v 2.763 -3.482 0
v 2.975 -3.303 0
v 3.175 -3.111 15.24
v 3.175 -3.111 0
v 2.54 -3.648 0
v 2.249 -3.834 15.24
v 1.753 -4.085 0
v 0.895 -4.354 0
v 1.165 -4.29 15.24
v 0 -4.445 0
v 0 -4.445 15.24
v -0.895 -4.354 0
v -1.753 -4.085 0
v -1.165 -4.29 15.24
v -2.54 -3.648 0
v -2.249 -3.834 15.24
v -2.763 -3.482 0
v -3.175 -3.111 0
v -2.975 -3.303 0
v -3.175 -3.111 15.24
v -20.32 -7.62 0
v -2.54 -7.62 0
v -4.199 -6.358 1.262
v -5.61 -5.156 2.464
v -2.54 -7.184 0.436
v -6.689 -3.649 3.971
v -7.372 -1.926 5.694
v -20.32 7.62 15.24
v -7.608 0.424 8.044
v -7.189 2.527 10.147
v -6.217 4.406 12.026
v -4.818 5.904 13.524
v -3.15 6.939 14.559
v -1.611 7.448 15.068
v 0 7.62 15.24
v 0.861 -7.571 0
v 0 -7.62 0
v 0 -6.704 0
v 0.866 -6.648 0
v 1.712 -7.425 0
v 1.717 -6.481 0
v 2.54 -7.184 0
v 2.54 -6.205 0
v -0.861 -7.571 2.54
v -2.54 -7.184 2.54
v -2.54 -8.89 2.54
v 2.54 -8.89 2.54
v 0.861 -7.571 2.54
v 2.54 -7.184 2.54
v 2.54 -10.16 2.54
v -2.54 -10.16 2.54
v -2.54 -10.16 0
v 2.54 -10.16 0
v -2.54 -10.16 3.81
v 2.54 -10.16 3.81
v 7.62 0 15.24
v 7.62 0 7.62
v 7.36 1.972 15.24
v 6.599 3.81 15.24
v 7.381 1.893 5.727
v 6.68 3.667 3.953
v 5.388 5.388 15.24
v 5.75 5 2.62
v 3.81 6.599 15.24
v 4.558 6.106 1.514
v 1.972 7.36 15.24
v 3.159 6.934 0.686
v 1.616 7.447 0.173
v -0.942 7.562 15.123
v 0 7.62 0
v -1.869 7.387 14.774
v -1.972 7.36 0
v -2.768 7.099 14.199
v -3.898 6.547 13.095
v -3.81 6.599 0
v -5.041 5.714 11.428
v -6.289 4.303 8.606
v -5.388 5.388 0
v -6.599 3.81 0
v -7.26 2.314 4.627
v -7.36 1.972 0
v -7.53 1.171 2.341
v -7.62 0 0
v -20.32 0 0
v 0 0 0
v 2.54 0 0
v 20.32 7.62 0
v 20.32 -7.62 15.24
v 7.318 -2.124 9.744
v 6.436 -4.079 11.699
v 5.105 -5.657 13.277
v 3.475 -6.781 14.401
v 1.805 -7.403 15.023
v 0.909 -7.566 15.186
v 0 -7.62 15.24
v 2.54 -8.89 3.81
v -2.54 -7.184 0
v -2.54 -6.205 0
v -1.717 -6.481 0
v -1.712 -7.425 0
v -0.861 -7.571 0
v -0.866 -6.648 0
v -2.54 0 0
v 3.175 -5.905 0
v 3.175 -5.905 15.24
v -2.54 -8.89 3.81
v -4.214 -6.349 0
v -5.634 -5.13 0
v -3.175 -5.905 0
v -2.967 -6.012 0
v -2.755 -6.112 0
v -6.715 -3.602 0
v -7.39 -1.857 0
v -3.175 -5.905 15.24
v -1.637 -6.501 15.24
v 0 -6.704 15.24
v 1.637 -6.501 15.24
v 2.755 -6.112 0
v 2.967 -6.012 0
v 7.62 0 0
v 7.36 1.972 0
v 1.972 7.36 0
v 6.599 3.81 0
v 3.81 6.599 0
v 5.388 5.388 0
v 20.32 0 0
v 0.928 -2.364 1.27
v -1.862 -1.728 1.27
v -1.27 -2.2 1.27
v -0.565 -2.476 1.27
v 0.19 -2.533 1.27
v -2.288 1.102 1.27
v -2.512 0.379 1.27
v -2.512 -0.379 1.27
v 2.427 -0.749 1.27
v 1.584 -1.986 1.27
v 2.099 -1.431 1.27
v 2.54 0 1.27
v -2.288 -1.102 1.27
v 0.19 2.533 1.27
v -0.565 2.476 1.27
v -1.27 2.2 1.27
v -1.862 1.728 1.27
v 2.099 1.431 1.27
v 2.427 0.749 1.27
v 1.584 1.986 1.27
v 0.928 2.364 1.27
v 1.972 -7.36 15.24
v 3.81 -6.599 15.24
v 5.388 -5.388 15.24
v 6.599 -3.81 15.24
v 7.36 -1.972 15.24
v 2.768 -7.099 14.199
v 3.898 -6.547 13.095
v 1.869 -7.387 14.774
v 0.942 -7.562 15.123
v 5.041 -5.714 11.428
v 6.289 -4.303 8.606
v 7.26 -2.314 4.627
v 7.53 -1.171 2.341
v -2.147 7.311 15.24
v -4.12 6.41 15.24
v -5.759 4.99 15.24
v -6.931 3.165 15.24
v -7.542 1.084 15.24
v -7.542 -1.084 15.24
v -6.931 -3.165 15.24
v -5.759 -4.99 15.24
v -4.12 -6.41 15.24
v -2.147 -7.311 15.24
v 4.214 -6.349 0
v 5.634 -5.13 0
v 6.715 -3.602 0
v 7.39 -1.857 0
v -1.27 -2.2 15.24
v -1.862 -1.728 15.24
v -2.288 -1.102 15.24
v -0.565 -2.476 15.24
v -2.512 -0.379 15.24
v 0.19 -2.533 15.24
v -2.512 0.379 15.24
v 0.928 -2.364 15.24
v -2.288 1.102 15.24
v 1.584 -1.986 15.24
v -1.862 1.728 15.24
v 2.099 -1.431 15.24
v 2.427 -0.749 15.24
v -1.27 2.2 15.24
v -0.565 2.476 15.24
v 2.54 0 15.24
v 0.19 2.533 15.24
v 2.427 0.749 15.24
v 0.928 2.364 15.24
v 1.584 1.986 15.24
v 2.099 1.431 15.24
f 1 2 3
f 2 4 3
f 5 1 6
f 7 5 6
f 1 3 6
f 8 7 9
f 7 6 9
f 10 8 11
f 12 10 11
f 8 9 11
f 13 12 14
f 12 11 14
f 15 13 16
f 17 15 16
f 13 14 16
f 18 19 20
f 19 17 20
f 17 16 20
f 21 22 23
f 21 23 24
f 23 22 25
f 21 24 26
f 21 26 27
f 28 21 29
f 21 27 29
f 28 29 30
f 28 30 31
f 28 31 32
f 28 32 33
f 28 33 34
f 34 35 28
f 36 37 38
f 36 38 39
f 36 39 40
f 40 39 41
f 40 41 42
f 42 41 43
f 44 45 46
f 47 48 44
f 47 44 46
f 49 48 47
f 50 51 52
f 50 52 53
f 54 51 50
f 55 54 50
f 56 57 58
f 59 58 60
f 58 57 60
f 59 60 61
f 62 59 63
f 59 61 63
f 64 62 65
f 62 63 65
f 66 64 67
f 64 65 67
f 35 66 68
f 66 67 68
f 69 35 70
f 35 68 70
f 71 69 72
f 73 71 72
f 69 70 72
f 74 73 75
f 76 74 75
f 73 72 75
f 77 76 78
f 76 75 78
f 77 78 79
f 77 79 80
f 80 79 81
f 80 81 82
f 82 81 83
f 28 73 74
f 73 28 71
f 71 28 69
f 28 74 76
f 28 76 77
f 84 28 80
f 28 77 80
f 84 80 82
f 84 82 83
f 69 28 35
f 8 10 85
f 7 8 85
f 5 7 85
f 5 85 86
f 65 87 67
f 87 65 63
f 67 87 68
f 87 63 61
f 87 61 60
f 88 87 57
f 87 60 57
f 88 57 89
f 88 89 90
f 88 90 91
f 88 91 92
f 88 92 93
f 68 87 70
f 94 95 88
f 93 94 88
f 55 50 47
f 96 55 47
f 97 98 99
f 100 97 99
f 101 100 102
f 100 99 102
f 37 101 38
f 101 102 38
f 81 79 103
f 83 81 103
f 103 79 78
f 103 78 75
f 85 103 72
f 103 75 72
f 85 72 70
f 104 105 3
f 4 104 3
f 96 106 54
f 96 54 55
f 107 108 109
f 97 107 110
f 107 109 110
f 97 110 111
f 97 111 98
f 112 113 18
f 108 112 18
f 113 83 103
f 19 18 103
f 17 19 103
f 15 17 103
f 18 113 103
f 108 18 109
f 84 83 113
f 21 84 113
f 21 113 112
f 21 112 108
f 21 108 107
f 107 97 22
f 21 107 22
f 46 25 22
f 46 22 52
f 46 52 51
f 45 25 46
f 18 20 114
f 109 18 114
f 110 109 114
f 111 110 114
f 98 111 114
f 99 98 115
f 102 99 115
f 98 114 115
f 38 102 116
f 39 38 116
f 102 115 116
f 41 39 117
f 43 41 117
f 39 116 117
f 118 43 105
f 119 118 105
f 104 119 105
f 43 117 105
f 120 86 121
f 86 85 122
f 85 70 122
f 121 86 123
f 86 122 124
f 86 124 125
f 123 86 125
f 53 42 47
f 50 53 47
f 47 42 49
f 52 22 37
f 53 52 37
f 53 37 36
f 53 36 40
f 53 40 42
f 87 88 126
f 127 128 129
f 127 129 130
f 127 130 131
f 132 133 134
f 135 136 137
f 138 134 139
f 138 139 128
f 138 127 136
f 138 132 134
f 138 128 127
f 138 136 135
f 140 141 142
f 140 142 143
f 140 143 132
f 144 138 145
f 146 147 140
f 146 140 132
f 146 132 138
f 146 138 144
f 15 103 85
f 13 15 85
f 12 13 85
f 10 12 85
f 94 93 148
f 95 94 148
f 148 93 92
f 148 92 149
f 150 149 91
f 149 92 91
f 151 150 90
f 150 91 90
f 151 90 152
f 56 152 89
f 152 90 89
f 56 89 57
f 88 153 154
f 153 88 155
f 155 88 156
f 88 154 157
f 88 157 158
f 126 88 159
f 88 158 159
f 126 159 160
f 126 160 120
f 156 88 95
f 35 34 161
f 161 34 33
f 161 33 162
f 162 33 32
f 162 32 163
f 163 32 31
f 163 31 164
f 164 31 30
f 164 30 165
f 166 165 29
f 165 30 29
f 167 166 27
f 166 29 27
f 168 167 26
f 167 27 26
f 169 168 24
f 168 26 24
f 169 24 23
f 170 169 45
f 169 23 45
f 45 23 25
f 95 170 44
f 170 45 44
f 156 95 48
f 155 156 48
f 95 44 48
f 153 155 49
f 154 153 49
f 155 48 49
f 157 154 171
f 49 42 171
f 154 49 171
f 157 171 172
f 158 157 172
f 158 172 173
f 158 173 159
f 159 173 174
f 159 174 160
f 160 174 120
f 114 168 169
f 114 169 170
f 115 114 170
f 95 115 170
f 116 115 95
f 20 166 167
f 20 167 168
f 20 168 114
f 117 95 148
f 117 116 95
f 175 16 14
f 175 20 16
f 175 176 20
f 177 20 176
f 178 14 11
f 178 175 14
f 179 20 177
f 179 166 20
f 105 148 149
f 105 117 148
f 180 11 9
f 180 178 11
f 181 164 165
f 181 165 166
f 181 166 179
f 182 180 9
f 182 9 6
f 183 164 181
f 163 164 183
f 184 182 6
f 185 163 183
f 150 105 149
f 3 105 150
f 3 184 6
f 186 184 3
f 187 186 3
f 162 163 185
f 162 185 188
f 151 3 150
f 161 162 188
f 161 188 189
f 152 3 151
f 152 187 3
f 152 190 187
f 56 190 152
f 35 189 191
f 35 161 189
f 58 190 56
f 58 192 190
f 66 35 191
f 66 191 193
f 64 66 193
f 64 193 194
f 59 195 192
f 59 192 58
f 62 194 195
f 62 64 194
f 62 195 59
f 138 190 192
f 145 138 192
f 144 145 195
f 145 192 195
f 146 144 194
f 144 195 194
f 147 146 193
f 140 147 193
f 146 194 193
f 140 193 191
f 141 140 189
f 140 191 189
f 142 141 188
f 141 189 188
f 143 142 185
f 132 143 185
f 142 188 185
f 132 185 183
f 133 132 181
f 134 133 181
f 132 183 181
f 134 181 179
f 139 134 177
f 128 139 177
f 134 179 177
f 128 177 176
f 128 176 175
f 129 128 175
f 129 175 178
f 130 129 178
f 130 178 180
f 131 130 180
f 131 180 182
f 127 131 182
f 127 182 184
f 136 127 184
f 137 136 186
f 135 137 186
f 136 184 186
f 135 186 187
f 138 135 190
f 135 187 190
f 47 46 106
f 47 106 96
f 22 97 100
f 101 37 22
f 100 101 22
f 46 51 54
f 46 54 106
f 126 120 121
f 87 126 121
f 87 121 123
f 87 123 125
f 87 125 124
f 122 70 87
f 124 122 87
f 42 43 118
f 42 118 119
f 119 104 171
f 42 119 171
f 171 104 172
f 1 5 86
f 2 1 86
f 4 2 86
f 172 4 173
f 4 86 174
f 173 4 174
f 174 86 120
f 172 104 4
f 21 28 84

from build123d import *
from build123d import SkipClean  # not in build123d's __all__

# Parameters (mm, degrees)
F0_R      = 7.62
F1_DEPTH  = 15.24
F3_DEPTH  = 20.32
F5_COUNT  = 2
F6_W      = 5.0799995622
F6_H      = 2.54
F7_DEPTH  = 10.16
F8_W      = 5.0799995622
F8_H      = 1.27
F9_DEPTH  = 1.27
F10_R     = 2.54
F11_DEPTH = 13.97
F13_DEPTH = 25.4


with BuildPart() as f1:
    # F0 (on Top) → F1 (new body)
    with BuildSketch(Plane.XY):
        Circle(F0_R)
    extrude(amount=F1_DEPTH)



with BuildPart() as f3:
    # F2 (on Right) → F3 (new body)
    with BuildSketch(Plane.YZ):
        Polygon((-7.62, 15.24), (0, 0), (7.62, 0), align=None)
    extrude(amount=F3_DEPTH)


with BuildPart() as f1_1:
    add(f1.part, clean=False)

    with SkipClean():  # cleaning this boolean's faces spoils the solid; the shape is the same uncleaned
        add(f3.part)  # F5 merges F3
    # F5: F3 ×2 about axis
    f5_axis = Axis((0, 0, 17.5851359963), (0, 0, 1))
    with SkipClean():  # cleaning this boolean's faces spoils the solid; the shape is the same uncleaned
        for i in range(1, F5_COUNT):
            add(f3.part.rotate(f5_axis, i * 360 / F5_COUNT), clean=False)

    # F6 (on Front) → F7 (join)
    with BuildSketch(Plane.XZ):
        with Locations((0, 1.27)):
            Rectangle(F6_W, F6_H)
    with SkipClean():  # cleaning this boolean's faces spoils the solid; the shape is the same uncleaned
        extrude(amount=F7_DEPTH)

    # F8 (on face) → F9 (join)
    with BuildSketch(Plane.XY.offset(2.54)):
        with Locations((0, -9.525)):
            Rectangle(F8_W, F8_H)
    with SkipClean():  # cleaning this boolean's faces spoils the solid; the shape is the same uncleaned
        extrude(amount=F9_DEPTH)

    # F10 (on face) → F11 (cut)
    with BuildSketch(Plane.XY.offset(15.24)):
        Circle(F10_R)
    with SkipClean():  # cleaning this boolean's faces spoils the solid; the shape is the same uncleaned
        extrude(amount=-F11_DEPTH, mode=Mode.SUBTRACT)

    # F12 (on face) → F13 (cut)
    with BuildSketch(Plane.XY.offset(15.24)):
        with BuildLine():
            ThreePointArc((3.175, -3.1108519733), (0, -4.445), (-3.175, -3.1108519733))
            Line((-3.175, -3.1108519733), (-3.175, -5.9048519733))
            ThreePointArc((-3.175, -5.9048519733), (0, -6.7043196394), (3.175, -5.9048519733))
            Line((3.175, -5.9048519733), (3.175, -3.1108519733))
        make_face()
    with SkipClean():  # cleaning this boolean's faces spoils the solid; the shape is the same uncleaned
        extrude(amount=-F13_DEPTH, mode=Mode.SUBTRACT)


solid = f1_1.part
